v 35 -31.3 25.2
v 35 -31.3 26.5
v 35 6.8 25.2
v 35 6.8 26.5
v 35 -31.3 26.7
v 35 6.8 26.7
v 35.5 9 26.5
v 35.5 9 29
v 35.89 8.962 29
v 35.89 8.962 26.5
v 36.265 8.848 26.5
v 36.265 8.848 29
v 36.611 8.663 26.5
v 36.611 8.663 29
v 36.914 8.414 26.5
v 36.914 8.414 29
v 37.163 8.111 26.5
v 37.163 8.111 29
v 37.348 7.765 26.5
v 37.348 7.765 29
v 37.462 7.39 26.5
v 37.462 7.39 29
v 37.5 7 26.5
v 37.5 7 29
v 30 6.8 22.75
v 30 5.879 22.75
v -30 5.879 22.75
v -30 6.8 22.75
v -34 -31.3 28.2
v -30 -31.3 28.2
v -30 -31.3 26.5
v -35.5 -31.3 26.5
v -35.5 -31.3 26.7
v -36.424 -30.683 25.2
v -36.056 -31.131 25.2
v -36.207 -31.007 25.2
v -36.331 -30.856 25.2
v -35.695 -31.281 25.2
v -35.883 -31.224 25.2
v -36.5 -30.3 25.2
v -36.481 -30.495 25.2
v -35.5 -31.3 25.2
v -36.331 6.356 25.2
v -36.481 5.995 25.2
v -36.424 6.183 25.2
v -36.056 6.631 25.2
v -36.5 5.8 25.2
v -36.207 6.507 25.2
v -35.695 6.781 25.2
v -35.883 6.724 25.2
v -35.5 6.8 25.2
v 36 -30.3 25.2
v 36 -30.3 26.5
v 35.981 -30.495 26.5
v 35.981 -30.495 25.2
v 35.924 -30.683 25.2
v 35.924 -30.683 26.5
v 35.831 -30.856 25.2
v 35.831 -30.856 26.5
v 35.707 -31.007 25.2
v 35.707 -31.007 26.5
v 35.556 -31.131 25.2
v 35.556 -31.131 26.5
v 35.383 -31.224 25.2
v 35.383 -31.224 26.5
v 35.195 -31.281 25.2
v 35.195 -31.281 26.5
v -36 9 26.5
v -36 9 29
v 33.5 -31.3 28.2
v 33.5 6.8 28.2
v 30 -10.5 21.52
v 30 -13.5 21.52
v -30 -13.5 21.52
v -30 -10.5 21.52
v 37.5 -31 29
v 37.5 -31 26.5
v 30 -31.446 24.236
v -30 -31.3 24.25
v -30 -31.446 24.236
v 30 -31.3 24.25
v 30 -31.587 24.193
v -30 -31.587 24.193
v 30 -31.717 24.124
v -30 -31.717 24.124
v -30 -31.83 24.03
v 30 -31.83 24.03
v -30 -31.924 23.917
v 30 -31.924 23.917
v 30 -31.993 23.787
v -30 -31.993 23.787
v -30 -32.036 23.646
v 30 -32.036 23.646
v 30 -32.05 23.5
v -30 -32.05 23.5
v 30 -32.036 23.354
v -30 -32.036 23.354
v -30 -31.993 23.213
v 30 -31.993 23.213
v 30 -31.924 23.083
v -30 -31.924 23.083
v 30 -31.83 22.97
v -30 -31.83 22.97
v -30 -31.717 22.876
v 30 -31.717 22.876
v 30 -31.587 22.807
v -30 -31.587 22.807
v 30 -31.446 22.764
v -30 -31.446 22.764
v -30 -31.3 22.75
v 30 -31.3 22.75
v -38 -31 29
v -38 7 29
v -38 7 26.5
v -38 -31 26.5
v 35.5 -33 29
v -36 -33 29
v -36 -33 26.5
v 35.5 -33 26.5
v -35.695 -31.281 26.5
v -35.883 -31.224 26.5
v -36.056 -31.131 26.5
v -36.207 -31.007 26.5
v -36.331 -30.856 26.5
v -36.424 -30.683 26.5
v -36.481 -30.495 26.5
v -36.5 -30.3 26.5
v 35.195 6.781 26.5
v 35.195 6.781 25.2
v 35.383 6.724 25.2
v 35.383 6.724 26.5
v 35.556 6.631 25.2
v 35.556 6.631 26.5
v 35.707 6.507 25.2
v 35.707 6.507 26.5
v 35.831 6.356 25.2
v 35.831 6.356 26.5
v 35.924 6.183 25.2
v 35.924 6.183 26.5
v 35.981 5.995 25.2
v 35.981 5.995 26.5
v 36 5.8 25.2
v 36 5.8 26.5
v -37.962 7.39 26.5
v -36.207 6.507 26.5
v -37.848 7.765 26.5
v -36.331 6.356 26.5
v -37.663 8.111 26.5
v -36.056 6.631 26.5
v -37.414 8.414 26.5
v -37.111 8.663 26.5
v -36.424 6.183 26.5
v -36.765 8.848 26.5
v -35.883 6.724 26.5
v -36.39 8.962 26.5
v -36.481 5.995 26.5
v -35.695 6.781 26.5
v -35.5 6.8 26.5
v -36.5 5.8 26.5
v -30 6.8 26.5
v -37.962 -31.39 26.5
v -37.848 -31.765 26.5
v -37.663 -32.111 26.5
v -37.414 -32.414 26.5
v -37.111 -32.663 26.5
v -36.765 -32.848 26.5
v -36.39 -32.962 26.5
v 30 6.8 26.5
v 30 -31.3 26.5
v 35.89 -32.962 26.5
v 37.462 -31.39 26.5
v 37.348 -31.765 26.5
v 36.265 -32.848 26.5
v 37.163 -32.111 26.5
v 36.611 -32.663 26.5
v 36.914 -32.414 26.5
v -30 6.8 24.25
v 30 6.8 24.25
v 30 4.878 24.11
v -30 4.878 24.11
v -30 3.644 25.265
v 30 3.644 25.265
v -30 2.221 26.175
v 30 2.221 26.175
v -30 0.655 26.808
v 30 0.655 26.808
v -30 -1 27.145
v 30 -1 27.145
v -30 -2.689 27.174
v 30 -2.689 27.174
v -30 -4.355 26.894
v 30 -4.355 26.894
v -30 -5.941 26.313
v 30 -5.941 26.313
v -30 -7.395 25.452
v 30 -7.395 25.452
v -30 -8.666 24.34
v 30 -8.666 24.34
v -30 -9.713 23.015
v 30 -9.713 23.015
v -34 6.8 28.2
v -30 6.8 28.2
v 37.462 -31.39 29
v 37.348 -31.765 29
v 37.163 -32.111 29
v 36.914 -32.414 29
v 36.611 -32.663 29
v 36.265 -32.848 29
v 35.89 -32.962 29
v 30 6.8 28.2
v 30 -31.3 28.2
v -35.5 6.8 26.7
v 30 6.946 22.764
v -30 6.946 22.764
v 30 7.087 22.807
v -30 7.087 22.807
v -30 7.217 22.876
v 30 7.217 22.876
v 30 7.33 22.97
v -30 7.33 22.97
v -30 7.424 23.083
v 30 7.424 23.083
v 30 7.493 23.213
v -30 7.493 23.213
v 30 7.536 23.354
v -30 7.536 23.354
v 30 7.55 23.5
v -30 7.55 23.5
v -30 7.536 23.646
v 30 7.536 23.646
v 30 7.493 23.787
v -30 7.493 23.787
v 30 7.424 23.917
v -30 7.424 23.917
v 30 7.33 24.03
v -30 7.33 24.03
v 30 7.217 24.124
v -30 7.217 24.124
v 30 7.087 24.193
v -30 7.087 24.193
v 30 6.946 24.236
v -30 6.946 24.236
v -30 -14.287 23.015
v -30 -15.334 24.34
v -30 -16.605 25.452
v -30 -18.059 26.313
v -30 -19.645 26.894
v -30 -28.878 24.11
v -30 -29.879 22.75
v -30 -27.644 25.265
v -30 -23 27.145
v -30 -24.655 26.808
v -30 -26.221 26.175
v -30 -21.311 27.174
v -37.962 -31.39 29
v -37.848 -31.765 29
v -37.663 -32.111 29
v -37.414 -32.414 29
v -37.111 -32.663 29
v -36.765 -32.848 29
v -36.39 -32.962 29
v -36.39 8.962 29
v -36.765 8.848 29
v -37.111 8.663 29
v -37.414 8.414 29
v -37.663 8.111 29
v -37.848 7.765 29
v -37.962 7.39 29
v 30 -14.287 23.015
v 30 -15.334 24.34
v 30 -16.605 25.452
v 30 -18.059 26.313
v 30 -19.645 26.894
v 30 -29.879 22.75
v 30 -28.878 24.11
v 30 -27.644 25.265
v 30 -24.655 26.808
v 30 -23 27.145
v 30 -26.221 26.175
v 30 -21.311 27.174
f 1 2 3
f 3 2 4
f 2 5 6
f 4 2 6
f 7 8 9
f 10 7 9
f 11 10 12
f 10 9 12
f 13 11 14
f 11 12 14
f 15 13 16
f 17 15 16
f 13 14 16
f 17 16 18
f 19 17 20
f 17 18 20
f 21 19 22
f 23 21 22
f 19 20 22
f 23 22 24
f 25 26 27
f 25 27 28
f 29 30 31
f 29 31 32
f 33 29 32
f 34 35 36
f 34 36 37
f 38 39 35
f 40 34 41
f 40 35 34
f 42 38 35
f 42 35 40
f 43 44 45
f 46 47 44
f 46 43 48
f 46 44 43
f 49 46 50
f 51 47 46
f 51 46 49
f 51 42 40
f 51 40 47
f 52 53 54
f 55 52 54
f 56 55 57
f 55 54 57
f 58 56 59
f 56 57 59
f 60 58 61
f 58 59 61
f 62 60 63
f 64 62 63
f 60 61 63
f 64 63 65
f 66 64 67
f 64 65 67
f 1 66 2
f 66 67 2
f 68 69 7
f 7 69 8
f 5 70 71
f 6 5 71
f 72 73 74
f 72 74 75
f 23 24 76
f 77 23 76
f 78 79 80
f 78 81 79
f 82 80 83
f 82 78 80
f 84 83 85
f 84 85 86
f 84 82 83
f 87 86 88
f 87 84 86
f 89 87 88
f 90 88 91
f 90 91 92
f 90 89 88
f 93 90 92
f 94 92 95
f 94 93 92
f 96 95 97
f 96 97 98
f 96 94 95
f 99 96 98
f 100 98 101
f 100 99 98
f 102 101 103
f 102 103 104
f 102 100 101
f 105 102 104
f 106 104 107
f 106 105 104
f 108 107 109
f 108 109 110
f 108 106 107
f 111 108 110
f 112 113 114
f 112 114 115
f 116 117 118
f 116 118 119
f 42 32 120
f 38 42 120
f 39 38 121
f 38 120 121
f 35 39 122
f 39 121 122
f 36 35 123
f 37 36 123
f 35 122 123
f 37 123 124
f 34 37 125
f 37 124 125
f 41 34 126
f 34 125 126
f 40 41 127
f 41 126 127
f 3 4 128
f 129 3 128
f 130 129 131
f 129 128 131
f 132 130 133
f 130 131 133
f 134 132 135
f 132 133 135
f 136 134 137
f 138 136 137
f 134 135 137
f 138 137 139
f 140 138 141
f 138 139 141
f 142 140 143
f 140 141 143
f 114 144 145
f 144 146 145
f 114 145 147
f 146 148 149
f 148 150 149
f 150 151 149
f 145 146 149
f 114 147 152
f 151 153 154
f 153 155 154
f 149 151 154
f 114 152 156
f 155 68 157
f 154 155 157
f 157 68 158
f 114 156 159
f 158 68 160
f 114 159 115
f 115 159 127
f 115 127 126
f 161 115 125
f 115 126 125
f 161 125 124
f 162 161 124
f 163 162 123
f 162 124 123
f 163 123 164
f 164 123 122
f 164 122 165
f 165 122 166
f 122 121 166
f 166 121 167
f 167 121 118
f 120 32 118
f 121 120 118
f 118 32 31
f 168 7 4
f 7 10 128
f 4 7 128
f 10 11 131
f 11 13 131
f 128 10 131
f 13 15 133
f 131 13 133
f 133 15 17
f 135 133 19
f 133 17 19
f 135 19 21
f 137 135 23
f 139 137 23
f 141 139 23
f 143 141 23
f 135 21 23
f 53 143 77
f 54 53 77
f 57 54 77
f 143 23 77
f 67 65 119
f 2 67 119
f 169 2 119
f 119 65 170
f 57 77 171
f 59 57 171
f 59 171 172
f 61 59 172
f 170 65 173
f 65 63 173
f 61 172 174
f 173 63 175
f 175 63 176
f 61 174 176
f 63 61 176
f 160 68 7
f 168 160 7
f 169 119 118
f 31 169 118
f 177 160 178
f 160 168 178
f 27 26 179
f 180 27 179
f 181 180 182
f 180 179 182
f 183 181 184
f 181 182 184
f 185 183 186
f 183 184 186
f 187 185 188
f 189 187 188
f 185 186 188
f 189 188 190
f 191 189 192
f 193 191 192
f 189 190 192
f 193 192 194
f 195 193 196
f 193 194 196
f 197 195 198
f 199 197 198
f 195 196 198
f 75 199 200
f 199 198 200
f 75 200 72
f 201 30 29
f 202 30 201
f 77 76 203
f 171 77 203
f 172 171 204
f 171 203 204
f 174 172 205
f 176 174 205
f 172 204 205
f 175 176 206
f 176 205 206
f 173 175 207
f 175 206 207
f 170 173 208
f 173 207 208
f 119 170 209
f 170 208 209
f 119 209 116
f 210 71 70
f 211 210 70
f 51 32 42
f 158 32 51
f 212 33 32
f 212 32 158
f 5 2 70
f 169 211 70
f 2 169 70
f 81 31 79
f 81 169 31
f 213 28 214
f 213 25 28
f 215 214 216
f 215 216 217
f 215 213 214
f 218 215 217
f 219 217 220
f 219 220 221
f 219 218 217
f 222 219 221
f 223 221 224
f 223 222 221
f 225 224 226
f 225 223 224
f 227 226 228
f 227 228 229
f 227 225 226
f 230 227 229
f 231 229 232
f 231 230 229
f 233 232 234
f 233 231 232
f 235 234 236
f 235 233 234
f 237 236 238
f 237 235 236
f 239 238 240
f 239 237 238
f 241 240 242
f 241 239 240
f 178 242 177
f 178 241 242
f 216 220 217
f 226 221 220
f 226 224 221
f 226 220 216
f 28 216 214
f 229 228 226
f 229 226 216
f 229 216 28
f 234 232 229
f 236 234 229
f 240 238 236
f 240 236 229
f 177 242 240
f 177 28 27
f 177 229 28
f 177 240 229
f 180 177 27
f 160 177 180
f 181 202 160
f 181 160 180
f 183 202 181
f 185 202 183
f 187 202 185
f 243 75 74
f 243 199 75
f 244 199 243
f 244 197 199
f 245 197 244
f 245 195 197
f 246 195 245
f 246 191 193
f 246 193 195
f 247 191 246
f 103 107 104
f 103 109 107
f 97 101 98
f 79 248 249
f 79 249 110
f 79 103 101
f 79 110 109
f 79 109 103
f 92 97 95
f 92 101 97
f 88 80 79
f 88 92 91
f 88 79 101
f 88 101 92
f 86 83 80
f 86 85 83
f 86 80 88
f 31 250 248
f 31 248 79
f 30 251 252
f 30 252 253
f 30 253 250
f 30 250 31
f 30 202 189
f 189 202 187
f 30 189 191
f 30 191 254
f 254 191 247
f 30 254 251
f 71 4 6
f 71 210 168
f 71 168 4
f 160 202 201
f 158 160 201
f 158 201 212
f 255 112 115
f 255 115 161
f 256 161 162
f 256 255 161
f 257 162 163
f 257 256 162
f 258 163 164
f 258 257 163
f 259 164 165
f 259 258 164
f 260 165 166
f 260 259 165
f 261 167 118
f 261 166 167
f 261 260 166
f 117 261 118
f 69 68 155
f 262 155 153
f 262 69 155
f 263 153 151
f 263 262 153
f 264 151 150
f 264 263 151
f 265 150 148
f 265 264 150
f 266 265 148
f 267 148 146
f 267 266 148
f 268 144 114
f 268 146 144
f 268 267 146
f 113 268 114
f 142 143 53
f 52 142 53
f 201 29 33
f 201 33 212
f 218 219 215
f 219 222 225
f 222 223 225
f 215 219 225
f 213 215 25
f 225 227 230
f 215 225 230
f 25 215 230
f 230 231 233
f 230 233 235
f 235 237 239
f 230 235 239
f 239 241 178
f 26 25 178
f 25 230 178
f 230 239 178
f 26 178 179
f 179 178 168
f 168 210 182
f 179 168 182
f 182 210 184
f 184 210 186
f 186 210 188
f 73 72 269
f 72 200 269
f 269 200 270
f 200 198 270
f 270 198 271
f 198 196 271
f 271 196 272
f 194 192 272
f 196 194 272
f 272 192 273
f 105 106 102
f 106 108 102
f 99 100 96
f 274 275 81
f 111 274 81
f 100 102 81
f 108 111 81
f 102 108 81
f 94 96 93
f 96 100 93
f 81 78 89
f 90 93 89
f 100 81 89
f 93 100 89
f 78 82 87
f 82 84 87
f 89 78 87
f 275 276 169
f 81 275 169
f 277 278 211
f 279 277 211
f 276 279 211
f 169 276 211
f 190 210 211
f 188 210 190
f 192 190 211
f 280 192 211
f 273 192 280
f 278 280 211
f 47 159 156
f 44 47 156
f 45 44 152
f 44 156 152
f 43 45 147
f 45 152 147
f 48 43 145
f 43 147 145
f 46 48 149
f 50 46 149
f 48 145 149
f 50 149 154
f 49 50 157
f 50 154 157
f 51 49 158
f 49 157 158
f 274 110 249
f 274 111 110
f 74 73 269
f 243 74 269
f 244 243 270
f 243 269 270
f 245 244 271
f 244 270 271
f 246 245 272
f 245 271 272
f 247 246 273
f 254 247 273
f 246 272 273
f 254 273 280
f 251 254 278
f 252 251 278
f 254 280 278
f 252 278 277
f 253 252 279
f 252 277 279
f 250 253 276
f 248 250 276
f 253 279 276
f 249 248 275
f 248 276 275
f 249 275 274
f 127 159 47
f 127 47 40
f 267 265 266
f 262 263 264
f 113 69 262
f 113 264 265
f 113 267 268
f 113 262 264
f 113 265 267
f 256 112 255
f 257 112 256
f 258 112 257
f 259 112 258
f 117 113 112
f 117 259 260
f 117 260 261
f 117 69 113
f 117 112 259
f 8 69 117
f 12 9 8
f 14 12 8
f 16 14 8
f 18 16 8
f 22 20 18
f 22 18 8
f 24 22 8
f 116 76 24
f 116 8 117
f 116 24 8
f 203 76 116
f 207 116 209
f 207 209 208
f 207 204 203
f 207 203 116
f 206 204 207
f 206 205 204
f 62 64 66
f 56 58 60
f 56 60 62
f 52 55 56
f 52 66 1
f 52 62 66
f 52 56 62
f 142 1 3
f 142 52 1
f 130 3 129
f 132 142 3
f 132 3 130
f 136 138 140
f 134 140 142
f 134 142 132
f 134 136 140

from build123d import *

# Parameters (mm, degrees)
PAD011_DEPTH    = 30
PAD012_DEPTH    = 0.8
PAD013_DEPTH    = 1.7
PAD014_DEPTH    = 3
CHAMFER002_SIZE = 1.5


with BuildPart() as part:
    # Sketch014 → Pad011 (new body, symmetric)
    with BuildSketch(Plane.YZ):
        with BuildLine():
            ThreePointArc((-13.5, 21.519943), (-21.311021, 27.174165), (-29.878928, 22.75))
            Line((-31.3, 22.75), (-29.878928, 22.75))
            ThreePointArc((-31.3, 24.25), (-32.05, 23.5), (-31.3, 22.75))
            Line((-31.3, 26.5), (-31.3, 24.25))
            Line((-33, 26.5), (-31.3, 26.5))
            Line((-33, 26.5), (-33, 29))
            Line((9, 29), (-33, 29))
            Line((9, 26.5), (9, 29))
            Line((9, 26.5), (6.8, 26.5))
            Line((6.8, 26.5), (6.8, 24.25))
            ThreePointArc((6.8, 22.75), (7.55, 23.5), (6.8, 24.25))
            Line((5.878928, 22.75), (6.8, 22.75))
            ThreePointArc((5.878928, 22.75), (-2.688979, 27.174165), (-10.5, 21.519943))
            Line((-13.5, 21.519943), (-10.5, 21.519943))
        make_face()
    extrude(amount=PAD011_DEPTH, both=True)

    # Sketch015 (on Face9 of Pad011) → Pad012 (join)
    with BuildSketch(Plane(origin=(0, 0, 29), x_dir=(0, -1, 0), z_dir=(0, 0, 1))):
        with BuildLine():
            ThreePointArc((-6.999999, 37.5), (-8.414213, 36.914214), (-9, 35.5))
            Line((-9, 30), (-9, 35.5))
            Line((33, 30), (-9, 30))
            Line((33, 35.5), (33, 30))
            ThreePointArc((33, 35.5), (32.414214, 36.914214), (31, 37.5))
            Line((-6.999999, 37.5), (31, 37.5))
        make_face()
        with BuildLine():
            Line((-9, -30), (33, -30))
            Line((33, -30), (33, -36))
            ThreePointArc((31, -38), (32.414214, -37.414214), (33, -36))
            Line((-7, -38), (31, -38))
            ThreePointArc((-9, -36.000001), (-8.414213, -37.414214), (-7, -38))
            Line((-9, -30), (-9, -36.000001))
        make_face()
    extrude(amount=-PAD012_DEPTH)

    # Sketch016 (on Face15 of Pad012) → Pad013 (join)
    with BuildSketch(Plane.YX.offset(-28.2)):
        with BuildLine():
            Line((-31.3, 30), (-33, 30))
            Line((-33, 30), (-33, 35.5))
            ThreePointArc((-31, 37.5), (-32.414214, 36.914214), (-33, 35.5))
            Line((6.999999, 37.5), (-31, 37.5))
            ThreePointArc((9, 35.5), (8.414213, 36.914214), (6.999999, 37.5))
            Line((9, 30), (9, 35.5))
            Line((9, 30), (6.8, 30))
            Line((6.8, 30), (6.8, 35))
            ThreePointArc((6.8, 35), (6.507107, 35.707107), (5.8, 36))
            Line((5.8, 36), (-30.3, 36))
            ThreePointArc((-30.3, 36), (-31.007107, 35.707107), (-31.3, 35))
            Line((-31.3, 30), (-31.3, 35))
        make_face()
        with BuildLine():
            ThreePointArc((7, -38), (8.414213, -37.414214), (9, -36.000001))
            Line((9, -30), (9, -36.000001))
            Line((6.8, -30), (9, -30))
            Line((6.8, -30), (6.8, -35.5))
            ThreePointArc((5.8, -36.5), (6.507107, -36.207107), (6.8, -35.5))
            Line((-30.3, -36.5), (5.8, -36.5))
            ThreePointArc((-31.3, -35.5), (-31.007107, -36.207107), (-30.3, -36.5))
            Line((-31.3, -30), (-31.3, -35.5))
            Line((-33, -30), (-31.3, -30))
            Line((-33, -36), (-33, -30))
            ThreePointArc((-33, -36), (-32.414214, -37.414214), (-31, -38))
            Line((-31, -38), (7, -38))
        make_face()
    extrude(amount=PAD013_DEPTH)

    # Sketch018 (on Face20 of Pad013) → Pad014 (join)
    with BuildSketch(Plane.YX.offset(-28.2)):
        with BuildLine():
            Line((-31.3, 35), (6.8, 35))
            ThreePointArc((6.8, 35), (6.507107, 35.707107), (5.8, 36))
            Line((5.8, 36), (-30.3, 36))
            ThreePointArc((-30.3, 36), (-31.007107, 35.707107), (-31.3, 35))
        make_face()
        with BuildLine():
            ThreePointArc((5.8, -36.5), (6.507107, -36.207107), (6.8, -35.5))
            Line((-31.3, -35.5), (6.8, -35.5))
            ThreePointArc((-31.3, -35.5), (-31.007107, -36.207107), (-30.3, -36.5))
            Line((5.8, -36.5), (-30.3, -36.5))
        make_face()
    extrude(amount=PAD014_DEPTH)

    # Chamfer002
    chamfer002_edges = [part.edges().sort_by_distance(p)[0] for p in [
        (35, -12.25, 28.2),
        (-35.5, -12.25, 28.2),
    ]]
    chamfer(chamfer002_edges, length=CHAMFER002_SIZE)


solid = part.part
